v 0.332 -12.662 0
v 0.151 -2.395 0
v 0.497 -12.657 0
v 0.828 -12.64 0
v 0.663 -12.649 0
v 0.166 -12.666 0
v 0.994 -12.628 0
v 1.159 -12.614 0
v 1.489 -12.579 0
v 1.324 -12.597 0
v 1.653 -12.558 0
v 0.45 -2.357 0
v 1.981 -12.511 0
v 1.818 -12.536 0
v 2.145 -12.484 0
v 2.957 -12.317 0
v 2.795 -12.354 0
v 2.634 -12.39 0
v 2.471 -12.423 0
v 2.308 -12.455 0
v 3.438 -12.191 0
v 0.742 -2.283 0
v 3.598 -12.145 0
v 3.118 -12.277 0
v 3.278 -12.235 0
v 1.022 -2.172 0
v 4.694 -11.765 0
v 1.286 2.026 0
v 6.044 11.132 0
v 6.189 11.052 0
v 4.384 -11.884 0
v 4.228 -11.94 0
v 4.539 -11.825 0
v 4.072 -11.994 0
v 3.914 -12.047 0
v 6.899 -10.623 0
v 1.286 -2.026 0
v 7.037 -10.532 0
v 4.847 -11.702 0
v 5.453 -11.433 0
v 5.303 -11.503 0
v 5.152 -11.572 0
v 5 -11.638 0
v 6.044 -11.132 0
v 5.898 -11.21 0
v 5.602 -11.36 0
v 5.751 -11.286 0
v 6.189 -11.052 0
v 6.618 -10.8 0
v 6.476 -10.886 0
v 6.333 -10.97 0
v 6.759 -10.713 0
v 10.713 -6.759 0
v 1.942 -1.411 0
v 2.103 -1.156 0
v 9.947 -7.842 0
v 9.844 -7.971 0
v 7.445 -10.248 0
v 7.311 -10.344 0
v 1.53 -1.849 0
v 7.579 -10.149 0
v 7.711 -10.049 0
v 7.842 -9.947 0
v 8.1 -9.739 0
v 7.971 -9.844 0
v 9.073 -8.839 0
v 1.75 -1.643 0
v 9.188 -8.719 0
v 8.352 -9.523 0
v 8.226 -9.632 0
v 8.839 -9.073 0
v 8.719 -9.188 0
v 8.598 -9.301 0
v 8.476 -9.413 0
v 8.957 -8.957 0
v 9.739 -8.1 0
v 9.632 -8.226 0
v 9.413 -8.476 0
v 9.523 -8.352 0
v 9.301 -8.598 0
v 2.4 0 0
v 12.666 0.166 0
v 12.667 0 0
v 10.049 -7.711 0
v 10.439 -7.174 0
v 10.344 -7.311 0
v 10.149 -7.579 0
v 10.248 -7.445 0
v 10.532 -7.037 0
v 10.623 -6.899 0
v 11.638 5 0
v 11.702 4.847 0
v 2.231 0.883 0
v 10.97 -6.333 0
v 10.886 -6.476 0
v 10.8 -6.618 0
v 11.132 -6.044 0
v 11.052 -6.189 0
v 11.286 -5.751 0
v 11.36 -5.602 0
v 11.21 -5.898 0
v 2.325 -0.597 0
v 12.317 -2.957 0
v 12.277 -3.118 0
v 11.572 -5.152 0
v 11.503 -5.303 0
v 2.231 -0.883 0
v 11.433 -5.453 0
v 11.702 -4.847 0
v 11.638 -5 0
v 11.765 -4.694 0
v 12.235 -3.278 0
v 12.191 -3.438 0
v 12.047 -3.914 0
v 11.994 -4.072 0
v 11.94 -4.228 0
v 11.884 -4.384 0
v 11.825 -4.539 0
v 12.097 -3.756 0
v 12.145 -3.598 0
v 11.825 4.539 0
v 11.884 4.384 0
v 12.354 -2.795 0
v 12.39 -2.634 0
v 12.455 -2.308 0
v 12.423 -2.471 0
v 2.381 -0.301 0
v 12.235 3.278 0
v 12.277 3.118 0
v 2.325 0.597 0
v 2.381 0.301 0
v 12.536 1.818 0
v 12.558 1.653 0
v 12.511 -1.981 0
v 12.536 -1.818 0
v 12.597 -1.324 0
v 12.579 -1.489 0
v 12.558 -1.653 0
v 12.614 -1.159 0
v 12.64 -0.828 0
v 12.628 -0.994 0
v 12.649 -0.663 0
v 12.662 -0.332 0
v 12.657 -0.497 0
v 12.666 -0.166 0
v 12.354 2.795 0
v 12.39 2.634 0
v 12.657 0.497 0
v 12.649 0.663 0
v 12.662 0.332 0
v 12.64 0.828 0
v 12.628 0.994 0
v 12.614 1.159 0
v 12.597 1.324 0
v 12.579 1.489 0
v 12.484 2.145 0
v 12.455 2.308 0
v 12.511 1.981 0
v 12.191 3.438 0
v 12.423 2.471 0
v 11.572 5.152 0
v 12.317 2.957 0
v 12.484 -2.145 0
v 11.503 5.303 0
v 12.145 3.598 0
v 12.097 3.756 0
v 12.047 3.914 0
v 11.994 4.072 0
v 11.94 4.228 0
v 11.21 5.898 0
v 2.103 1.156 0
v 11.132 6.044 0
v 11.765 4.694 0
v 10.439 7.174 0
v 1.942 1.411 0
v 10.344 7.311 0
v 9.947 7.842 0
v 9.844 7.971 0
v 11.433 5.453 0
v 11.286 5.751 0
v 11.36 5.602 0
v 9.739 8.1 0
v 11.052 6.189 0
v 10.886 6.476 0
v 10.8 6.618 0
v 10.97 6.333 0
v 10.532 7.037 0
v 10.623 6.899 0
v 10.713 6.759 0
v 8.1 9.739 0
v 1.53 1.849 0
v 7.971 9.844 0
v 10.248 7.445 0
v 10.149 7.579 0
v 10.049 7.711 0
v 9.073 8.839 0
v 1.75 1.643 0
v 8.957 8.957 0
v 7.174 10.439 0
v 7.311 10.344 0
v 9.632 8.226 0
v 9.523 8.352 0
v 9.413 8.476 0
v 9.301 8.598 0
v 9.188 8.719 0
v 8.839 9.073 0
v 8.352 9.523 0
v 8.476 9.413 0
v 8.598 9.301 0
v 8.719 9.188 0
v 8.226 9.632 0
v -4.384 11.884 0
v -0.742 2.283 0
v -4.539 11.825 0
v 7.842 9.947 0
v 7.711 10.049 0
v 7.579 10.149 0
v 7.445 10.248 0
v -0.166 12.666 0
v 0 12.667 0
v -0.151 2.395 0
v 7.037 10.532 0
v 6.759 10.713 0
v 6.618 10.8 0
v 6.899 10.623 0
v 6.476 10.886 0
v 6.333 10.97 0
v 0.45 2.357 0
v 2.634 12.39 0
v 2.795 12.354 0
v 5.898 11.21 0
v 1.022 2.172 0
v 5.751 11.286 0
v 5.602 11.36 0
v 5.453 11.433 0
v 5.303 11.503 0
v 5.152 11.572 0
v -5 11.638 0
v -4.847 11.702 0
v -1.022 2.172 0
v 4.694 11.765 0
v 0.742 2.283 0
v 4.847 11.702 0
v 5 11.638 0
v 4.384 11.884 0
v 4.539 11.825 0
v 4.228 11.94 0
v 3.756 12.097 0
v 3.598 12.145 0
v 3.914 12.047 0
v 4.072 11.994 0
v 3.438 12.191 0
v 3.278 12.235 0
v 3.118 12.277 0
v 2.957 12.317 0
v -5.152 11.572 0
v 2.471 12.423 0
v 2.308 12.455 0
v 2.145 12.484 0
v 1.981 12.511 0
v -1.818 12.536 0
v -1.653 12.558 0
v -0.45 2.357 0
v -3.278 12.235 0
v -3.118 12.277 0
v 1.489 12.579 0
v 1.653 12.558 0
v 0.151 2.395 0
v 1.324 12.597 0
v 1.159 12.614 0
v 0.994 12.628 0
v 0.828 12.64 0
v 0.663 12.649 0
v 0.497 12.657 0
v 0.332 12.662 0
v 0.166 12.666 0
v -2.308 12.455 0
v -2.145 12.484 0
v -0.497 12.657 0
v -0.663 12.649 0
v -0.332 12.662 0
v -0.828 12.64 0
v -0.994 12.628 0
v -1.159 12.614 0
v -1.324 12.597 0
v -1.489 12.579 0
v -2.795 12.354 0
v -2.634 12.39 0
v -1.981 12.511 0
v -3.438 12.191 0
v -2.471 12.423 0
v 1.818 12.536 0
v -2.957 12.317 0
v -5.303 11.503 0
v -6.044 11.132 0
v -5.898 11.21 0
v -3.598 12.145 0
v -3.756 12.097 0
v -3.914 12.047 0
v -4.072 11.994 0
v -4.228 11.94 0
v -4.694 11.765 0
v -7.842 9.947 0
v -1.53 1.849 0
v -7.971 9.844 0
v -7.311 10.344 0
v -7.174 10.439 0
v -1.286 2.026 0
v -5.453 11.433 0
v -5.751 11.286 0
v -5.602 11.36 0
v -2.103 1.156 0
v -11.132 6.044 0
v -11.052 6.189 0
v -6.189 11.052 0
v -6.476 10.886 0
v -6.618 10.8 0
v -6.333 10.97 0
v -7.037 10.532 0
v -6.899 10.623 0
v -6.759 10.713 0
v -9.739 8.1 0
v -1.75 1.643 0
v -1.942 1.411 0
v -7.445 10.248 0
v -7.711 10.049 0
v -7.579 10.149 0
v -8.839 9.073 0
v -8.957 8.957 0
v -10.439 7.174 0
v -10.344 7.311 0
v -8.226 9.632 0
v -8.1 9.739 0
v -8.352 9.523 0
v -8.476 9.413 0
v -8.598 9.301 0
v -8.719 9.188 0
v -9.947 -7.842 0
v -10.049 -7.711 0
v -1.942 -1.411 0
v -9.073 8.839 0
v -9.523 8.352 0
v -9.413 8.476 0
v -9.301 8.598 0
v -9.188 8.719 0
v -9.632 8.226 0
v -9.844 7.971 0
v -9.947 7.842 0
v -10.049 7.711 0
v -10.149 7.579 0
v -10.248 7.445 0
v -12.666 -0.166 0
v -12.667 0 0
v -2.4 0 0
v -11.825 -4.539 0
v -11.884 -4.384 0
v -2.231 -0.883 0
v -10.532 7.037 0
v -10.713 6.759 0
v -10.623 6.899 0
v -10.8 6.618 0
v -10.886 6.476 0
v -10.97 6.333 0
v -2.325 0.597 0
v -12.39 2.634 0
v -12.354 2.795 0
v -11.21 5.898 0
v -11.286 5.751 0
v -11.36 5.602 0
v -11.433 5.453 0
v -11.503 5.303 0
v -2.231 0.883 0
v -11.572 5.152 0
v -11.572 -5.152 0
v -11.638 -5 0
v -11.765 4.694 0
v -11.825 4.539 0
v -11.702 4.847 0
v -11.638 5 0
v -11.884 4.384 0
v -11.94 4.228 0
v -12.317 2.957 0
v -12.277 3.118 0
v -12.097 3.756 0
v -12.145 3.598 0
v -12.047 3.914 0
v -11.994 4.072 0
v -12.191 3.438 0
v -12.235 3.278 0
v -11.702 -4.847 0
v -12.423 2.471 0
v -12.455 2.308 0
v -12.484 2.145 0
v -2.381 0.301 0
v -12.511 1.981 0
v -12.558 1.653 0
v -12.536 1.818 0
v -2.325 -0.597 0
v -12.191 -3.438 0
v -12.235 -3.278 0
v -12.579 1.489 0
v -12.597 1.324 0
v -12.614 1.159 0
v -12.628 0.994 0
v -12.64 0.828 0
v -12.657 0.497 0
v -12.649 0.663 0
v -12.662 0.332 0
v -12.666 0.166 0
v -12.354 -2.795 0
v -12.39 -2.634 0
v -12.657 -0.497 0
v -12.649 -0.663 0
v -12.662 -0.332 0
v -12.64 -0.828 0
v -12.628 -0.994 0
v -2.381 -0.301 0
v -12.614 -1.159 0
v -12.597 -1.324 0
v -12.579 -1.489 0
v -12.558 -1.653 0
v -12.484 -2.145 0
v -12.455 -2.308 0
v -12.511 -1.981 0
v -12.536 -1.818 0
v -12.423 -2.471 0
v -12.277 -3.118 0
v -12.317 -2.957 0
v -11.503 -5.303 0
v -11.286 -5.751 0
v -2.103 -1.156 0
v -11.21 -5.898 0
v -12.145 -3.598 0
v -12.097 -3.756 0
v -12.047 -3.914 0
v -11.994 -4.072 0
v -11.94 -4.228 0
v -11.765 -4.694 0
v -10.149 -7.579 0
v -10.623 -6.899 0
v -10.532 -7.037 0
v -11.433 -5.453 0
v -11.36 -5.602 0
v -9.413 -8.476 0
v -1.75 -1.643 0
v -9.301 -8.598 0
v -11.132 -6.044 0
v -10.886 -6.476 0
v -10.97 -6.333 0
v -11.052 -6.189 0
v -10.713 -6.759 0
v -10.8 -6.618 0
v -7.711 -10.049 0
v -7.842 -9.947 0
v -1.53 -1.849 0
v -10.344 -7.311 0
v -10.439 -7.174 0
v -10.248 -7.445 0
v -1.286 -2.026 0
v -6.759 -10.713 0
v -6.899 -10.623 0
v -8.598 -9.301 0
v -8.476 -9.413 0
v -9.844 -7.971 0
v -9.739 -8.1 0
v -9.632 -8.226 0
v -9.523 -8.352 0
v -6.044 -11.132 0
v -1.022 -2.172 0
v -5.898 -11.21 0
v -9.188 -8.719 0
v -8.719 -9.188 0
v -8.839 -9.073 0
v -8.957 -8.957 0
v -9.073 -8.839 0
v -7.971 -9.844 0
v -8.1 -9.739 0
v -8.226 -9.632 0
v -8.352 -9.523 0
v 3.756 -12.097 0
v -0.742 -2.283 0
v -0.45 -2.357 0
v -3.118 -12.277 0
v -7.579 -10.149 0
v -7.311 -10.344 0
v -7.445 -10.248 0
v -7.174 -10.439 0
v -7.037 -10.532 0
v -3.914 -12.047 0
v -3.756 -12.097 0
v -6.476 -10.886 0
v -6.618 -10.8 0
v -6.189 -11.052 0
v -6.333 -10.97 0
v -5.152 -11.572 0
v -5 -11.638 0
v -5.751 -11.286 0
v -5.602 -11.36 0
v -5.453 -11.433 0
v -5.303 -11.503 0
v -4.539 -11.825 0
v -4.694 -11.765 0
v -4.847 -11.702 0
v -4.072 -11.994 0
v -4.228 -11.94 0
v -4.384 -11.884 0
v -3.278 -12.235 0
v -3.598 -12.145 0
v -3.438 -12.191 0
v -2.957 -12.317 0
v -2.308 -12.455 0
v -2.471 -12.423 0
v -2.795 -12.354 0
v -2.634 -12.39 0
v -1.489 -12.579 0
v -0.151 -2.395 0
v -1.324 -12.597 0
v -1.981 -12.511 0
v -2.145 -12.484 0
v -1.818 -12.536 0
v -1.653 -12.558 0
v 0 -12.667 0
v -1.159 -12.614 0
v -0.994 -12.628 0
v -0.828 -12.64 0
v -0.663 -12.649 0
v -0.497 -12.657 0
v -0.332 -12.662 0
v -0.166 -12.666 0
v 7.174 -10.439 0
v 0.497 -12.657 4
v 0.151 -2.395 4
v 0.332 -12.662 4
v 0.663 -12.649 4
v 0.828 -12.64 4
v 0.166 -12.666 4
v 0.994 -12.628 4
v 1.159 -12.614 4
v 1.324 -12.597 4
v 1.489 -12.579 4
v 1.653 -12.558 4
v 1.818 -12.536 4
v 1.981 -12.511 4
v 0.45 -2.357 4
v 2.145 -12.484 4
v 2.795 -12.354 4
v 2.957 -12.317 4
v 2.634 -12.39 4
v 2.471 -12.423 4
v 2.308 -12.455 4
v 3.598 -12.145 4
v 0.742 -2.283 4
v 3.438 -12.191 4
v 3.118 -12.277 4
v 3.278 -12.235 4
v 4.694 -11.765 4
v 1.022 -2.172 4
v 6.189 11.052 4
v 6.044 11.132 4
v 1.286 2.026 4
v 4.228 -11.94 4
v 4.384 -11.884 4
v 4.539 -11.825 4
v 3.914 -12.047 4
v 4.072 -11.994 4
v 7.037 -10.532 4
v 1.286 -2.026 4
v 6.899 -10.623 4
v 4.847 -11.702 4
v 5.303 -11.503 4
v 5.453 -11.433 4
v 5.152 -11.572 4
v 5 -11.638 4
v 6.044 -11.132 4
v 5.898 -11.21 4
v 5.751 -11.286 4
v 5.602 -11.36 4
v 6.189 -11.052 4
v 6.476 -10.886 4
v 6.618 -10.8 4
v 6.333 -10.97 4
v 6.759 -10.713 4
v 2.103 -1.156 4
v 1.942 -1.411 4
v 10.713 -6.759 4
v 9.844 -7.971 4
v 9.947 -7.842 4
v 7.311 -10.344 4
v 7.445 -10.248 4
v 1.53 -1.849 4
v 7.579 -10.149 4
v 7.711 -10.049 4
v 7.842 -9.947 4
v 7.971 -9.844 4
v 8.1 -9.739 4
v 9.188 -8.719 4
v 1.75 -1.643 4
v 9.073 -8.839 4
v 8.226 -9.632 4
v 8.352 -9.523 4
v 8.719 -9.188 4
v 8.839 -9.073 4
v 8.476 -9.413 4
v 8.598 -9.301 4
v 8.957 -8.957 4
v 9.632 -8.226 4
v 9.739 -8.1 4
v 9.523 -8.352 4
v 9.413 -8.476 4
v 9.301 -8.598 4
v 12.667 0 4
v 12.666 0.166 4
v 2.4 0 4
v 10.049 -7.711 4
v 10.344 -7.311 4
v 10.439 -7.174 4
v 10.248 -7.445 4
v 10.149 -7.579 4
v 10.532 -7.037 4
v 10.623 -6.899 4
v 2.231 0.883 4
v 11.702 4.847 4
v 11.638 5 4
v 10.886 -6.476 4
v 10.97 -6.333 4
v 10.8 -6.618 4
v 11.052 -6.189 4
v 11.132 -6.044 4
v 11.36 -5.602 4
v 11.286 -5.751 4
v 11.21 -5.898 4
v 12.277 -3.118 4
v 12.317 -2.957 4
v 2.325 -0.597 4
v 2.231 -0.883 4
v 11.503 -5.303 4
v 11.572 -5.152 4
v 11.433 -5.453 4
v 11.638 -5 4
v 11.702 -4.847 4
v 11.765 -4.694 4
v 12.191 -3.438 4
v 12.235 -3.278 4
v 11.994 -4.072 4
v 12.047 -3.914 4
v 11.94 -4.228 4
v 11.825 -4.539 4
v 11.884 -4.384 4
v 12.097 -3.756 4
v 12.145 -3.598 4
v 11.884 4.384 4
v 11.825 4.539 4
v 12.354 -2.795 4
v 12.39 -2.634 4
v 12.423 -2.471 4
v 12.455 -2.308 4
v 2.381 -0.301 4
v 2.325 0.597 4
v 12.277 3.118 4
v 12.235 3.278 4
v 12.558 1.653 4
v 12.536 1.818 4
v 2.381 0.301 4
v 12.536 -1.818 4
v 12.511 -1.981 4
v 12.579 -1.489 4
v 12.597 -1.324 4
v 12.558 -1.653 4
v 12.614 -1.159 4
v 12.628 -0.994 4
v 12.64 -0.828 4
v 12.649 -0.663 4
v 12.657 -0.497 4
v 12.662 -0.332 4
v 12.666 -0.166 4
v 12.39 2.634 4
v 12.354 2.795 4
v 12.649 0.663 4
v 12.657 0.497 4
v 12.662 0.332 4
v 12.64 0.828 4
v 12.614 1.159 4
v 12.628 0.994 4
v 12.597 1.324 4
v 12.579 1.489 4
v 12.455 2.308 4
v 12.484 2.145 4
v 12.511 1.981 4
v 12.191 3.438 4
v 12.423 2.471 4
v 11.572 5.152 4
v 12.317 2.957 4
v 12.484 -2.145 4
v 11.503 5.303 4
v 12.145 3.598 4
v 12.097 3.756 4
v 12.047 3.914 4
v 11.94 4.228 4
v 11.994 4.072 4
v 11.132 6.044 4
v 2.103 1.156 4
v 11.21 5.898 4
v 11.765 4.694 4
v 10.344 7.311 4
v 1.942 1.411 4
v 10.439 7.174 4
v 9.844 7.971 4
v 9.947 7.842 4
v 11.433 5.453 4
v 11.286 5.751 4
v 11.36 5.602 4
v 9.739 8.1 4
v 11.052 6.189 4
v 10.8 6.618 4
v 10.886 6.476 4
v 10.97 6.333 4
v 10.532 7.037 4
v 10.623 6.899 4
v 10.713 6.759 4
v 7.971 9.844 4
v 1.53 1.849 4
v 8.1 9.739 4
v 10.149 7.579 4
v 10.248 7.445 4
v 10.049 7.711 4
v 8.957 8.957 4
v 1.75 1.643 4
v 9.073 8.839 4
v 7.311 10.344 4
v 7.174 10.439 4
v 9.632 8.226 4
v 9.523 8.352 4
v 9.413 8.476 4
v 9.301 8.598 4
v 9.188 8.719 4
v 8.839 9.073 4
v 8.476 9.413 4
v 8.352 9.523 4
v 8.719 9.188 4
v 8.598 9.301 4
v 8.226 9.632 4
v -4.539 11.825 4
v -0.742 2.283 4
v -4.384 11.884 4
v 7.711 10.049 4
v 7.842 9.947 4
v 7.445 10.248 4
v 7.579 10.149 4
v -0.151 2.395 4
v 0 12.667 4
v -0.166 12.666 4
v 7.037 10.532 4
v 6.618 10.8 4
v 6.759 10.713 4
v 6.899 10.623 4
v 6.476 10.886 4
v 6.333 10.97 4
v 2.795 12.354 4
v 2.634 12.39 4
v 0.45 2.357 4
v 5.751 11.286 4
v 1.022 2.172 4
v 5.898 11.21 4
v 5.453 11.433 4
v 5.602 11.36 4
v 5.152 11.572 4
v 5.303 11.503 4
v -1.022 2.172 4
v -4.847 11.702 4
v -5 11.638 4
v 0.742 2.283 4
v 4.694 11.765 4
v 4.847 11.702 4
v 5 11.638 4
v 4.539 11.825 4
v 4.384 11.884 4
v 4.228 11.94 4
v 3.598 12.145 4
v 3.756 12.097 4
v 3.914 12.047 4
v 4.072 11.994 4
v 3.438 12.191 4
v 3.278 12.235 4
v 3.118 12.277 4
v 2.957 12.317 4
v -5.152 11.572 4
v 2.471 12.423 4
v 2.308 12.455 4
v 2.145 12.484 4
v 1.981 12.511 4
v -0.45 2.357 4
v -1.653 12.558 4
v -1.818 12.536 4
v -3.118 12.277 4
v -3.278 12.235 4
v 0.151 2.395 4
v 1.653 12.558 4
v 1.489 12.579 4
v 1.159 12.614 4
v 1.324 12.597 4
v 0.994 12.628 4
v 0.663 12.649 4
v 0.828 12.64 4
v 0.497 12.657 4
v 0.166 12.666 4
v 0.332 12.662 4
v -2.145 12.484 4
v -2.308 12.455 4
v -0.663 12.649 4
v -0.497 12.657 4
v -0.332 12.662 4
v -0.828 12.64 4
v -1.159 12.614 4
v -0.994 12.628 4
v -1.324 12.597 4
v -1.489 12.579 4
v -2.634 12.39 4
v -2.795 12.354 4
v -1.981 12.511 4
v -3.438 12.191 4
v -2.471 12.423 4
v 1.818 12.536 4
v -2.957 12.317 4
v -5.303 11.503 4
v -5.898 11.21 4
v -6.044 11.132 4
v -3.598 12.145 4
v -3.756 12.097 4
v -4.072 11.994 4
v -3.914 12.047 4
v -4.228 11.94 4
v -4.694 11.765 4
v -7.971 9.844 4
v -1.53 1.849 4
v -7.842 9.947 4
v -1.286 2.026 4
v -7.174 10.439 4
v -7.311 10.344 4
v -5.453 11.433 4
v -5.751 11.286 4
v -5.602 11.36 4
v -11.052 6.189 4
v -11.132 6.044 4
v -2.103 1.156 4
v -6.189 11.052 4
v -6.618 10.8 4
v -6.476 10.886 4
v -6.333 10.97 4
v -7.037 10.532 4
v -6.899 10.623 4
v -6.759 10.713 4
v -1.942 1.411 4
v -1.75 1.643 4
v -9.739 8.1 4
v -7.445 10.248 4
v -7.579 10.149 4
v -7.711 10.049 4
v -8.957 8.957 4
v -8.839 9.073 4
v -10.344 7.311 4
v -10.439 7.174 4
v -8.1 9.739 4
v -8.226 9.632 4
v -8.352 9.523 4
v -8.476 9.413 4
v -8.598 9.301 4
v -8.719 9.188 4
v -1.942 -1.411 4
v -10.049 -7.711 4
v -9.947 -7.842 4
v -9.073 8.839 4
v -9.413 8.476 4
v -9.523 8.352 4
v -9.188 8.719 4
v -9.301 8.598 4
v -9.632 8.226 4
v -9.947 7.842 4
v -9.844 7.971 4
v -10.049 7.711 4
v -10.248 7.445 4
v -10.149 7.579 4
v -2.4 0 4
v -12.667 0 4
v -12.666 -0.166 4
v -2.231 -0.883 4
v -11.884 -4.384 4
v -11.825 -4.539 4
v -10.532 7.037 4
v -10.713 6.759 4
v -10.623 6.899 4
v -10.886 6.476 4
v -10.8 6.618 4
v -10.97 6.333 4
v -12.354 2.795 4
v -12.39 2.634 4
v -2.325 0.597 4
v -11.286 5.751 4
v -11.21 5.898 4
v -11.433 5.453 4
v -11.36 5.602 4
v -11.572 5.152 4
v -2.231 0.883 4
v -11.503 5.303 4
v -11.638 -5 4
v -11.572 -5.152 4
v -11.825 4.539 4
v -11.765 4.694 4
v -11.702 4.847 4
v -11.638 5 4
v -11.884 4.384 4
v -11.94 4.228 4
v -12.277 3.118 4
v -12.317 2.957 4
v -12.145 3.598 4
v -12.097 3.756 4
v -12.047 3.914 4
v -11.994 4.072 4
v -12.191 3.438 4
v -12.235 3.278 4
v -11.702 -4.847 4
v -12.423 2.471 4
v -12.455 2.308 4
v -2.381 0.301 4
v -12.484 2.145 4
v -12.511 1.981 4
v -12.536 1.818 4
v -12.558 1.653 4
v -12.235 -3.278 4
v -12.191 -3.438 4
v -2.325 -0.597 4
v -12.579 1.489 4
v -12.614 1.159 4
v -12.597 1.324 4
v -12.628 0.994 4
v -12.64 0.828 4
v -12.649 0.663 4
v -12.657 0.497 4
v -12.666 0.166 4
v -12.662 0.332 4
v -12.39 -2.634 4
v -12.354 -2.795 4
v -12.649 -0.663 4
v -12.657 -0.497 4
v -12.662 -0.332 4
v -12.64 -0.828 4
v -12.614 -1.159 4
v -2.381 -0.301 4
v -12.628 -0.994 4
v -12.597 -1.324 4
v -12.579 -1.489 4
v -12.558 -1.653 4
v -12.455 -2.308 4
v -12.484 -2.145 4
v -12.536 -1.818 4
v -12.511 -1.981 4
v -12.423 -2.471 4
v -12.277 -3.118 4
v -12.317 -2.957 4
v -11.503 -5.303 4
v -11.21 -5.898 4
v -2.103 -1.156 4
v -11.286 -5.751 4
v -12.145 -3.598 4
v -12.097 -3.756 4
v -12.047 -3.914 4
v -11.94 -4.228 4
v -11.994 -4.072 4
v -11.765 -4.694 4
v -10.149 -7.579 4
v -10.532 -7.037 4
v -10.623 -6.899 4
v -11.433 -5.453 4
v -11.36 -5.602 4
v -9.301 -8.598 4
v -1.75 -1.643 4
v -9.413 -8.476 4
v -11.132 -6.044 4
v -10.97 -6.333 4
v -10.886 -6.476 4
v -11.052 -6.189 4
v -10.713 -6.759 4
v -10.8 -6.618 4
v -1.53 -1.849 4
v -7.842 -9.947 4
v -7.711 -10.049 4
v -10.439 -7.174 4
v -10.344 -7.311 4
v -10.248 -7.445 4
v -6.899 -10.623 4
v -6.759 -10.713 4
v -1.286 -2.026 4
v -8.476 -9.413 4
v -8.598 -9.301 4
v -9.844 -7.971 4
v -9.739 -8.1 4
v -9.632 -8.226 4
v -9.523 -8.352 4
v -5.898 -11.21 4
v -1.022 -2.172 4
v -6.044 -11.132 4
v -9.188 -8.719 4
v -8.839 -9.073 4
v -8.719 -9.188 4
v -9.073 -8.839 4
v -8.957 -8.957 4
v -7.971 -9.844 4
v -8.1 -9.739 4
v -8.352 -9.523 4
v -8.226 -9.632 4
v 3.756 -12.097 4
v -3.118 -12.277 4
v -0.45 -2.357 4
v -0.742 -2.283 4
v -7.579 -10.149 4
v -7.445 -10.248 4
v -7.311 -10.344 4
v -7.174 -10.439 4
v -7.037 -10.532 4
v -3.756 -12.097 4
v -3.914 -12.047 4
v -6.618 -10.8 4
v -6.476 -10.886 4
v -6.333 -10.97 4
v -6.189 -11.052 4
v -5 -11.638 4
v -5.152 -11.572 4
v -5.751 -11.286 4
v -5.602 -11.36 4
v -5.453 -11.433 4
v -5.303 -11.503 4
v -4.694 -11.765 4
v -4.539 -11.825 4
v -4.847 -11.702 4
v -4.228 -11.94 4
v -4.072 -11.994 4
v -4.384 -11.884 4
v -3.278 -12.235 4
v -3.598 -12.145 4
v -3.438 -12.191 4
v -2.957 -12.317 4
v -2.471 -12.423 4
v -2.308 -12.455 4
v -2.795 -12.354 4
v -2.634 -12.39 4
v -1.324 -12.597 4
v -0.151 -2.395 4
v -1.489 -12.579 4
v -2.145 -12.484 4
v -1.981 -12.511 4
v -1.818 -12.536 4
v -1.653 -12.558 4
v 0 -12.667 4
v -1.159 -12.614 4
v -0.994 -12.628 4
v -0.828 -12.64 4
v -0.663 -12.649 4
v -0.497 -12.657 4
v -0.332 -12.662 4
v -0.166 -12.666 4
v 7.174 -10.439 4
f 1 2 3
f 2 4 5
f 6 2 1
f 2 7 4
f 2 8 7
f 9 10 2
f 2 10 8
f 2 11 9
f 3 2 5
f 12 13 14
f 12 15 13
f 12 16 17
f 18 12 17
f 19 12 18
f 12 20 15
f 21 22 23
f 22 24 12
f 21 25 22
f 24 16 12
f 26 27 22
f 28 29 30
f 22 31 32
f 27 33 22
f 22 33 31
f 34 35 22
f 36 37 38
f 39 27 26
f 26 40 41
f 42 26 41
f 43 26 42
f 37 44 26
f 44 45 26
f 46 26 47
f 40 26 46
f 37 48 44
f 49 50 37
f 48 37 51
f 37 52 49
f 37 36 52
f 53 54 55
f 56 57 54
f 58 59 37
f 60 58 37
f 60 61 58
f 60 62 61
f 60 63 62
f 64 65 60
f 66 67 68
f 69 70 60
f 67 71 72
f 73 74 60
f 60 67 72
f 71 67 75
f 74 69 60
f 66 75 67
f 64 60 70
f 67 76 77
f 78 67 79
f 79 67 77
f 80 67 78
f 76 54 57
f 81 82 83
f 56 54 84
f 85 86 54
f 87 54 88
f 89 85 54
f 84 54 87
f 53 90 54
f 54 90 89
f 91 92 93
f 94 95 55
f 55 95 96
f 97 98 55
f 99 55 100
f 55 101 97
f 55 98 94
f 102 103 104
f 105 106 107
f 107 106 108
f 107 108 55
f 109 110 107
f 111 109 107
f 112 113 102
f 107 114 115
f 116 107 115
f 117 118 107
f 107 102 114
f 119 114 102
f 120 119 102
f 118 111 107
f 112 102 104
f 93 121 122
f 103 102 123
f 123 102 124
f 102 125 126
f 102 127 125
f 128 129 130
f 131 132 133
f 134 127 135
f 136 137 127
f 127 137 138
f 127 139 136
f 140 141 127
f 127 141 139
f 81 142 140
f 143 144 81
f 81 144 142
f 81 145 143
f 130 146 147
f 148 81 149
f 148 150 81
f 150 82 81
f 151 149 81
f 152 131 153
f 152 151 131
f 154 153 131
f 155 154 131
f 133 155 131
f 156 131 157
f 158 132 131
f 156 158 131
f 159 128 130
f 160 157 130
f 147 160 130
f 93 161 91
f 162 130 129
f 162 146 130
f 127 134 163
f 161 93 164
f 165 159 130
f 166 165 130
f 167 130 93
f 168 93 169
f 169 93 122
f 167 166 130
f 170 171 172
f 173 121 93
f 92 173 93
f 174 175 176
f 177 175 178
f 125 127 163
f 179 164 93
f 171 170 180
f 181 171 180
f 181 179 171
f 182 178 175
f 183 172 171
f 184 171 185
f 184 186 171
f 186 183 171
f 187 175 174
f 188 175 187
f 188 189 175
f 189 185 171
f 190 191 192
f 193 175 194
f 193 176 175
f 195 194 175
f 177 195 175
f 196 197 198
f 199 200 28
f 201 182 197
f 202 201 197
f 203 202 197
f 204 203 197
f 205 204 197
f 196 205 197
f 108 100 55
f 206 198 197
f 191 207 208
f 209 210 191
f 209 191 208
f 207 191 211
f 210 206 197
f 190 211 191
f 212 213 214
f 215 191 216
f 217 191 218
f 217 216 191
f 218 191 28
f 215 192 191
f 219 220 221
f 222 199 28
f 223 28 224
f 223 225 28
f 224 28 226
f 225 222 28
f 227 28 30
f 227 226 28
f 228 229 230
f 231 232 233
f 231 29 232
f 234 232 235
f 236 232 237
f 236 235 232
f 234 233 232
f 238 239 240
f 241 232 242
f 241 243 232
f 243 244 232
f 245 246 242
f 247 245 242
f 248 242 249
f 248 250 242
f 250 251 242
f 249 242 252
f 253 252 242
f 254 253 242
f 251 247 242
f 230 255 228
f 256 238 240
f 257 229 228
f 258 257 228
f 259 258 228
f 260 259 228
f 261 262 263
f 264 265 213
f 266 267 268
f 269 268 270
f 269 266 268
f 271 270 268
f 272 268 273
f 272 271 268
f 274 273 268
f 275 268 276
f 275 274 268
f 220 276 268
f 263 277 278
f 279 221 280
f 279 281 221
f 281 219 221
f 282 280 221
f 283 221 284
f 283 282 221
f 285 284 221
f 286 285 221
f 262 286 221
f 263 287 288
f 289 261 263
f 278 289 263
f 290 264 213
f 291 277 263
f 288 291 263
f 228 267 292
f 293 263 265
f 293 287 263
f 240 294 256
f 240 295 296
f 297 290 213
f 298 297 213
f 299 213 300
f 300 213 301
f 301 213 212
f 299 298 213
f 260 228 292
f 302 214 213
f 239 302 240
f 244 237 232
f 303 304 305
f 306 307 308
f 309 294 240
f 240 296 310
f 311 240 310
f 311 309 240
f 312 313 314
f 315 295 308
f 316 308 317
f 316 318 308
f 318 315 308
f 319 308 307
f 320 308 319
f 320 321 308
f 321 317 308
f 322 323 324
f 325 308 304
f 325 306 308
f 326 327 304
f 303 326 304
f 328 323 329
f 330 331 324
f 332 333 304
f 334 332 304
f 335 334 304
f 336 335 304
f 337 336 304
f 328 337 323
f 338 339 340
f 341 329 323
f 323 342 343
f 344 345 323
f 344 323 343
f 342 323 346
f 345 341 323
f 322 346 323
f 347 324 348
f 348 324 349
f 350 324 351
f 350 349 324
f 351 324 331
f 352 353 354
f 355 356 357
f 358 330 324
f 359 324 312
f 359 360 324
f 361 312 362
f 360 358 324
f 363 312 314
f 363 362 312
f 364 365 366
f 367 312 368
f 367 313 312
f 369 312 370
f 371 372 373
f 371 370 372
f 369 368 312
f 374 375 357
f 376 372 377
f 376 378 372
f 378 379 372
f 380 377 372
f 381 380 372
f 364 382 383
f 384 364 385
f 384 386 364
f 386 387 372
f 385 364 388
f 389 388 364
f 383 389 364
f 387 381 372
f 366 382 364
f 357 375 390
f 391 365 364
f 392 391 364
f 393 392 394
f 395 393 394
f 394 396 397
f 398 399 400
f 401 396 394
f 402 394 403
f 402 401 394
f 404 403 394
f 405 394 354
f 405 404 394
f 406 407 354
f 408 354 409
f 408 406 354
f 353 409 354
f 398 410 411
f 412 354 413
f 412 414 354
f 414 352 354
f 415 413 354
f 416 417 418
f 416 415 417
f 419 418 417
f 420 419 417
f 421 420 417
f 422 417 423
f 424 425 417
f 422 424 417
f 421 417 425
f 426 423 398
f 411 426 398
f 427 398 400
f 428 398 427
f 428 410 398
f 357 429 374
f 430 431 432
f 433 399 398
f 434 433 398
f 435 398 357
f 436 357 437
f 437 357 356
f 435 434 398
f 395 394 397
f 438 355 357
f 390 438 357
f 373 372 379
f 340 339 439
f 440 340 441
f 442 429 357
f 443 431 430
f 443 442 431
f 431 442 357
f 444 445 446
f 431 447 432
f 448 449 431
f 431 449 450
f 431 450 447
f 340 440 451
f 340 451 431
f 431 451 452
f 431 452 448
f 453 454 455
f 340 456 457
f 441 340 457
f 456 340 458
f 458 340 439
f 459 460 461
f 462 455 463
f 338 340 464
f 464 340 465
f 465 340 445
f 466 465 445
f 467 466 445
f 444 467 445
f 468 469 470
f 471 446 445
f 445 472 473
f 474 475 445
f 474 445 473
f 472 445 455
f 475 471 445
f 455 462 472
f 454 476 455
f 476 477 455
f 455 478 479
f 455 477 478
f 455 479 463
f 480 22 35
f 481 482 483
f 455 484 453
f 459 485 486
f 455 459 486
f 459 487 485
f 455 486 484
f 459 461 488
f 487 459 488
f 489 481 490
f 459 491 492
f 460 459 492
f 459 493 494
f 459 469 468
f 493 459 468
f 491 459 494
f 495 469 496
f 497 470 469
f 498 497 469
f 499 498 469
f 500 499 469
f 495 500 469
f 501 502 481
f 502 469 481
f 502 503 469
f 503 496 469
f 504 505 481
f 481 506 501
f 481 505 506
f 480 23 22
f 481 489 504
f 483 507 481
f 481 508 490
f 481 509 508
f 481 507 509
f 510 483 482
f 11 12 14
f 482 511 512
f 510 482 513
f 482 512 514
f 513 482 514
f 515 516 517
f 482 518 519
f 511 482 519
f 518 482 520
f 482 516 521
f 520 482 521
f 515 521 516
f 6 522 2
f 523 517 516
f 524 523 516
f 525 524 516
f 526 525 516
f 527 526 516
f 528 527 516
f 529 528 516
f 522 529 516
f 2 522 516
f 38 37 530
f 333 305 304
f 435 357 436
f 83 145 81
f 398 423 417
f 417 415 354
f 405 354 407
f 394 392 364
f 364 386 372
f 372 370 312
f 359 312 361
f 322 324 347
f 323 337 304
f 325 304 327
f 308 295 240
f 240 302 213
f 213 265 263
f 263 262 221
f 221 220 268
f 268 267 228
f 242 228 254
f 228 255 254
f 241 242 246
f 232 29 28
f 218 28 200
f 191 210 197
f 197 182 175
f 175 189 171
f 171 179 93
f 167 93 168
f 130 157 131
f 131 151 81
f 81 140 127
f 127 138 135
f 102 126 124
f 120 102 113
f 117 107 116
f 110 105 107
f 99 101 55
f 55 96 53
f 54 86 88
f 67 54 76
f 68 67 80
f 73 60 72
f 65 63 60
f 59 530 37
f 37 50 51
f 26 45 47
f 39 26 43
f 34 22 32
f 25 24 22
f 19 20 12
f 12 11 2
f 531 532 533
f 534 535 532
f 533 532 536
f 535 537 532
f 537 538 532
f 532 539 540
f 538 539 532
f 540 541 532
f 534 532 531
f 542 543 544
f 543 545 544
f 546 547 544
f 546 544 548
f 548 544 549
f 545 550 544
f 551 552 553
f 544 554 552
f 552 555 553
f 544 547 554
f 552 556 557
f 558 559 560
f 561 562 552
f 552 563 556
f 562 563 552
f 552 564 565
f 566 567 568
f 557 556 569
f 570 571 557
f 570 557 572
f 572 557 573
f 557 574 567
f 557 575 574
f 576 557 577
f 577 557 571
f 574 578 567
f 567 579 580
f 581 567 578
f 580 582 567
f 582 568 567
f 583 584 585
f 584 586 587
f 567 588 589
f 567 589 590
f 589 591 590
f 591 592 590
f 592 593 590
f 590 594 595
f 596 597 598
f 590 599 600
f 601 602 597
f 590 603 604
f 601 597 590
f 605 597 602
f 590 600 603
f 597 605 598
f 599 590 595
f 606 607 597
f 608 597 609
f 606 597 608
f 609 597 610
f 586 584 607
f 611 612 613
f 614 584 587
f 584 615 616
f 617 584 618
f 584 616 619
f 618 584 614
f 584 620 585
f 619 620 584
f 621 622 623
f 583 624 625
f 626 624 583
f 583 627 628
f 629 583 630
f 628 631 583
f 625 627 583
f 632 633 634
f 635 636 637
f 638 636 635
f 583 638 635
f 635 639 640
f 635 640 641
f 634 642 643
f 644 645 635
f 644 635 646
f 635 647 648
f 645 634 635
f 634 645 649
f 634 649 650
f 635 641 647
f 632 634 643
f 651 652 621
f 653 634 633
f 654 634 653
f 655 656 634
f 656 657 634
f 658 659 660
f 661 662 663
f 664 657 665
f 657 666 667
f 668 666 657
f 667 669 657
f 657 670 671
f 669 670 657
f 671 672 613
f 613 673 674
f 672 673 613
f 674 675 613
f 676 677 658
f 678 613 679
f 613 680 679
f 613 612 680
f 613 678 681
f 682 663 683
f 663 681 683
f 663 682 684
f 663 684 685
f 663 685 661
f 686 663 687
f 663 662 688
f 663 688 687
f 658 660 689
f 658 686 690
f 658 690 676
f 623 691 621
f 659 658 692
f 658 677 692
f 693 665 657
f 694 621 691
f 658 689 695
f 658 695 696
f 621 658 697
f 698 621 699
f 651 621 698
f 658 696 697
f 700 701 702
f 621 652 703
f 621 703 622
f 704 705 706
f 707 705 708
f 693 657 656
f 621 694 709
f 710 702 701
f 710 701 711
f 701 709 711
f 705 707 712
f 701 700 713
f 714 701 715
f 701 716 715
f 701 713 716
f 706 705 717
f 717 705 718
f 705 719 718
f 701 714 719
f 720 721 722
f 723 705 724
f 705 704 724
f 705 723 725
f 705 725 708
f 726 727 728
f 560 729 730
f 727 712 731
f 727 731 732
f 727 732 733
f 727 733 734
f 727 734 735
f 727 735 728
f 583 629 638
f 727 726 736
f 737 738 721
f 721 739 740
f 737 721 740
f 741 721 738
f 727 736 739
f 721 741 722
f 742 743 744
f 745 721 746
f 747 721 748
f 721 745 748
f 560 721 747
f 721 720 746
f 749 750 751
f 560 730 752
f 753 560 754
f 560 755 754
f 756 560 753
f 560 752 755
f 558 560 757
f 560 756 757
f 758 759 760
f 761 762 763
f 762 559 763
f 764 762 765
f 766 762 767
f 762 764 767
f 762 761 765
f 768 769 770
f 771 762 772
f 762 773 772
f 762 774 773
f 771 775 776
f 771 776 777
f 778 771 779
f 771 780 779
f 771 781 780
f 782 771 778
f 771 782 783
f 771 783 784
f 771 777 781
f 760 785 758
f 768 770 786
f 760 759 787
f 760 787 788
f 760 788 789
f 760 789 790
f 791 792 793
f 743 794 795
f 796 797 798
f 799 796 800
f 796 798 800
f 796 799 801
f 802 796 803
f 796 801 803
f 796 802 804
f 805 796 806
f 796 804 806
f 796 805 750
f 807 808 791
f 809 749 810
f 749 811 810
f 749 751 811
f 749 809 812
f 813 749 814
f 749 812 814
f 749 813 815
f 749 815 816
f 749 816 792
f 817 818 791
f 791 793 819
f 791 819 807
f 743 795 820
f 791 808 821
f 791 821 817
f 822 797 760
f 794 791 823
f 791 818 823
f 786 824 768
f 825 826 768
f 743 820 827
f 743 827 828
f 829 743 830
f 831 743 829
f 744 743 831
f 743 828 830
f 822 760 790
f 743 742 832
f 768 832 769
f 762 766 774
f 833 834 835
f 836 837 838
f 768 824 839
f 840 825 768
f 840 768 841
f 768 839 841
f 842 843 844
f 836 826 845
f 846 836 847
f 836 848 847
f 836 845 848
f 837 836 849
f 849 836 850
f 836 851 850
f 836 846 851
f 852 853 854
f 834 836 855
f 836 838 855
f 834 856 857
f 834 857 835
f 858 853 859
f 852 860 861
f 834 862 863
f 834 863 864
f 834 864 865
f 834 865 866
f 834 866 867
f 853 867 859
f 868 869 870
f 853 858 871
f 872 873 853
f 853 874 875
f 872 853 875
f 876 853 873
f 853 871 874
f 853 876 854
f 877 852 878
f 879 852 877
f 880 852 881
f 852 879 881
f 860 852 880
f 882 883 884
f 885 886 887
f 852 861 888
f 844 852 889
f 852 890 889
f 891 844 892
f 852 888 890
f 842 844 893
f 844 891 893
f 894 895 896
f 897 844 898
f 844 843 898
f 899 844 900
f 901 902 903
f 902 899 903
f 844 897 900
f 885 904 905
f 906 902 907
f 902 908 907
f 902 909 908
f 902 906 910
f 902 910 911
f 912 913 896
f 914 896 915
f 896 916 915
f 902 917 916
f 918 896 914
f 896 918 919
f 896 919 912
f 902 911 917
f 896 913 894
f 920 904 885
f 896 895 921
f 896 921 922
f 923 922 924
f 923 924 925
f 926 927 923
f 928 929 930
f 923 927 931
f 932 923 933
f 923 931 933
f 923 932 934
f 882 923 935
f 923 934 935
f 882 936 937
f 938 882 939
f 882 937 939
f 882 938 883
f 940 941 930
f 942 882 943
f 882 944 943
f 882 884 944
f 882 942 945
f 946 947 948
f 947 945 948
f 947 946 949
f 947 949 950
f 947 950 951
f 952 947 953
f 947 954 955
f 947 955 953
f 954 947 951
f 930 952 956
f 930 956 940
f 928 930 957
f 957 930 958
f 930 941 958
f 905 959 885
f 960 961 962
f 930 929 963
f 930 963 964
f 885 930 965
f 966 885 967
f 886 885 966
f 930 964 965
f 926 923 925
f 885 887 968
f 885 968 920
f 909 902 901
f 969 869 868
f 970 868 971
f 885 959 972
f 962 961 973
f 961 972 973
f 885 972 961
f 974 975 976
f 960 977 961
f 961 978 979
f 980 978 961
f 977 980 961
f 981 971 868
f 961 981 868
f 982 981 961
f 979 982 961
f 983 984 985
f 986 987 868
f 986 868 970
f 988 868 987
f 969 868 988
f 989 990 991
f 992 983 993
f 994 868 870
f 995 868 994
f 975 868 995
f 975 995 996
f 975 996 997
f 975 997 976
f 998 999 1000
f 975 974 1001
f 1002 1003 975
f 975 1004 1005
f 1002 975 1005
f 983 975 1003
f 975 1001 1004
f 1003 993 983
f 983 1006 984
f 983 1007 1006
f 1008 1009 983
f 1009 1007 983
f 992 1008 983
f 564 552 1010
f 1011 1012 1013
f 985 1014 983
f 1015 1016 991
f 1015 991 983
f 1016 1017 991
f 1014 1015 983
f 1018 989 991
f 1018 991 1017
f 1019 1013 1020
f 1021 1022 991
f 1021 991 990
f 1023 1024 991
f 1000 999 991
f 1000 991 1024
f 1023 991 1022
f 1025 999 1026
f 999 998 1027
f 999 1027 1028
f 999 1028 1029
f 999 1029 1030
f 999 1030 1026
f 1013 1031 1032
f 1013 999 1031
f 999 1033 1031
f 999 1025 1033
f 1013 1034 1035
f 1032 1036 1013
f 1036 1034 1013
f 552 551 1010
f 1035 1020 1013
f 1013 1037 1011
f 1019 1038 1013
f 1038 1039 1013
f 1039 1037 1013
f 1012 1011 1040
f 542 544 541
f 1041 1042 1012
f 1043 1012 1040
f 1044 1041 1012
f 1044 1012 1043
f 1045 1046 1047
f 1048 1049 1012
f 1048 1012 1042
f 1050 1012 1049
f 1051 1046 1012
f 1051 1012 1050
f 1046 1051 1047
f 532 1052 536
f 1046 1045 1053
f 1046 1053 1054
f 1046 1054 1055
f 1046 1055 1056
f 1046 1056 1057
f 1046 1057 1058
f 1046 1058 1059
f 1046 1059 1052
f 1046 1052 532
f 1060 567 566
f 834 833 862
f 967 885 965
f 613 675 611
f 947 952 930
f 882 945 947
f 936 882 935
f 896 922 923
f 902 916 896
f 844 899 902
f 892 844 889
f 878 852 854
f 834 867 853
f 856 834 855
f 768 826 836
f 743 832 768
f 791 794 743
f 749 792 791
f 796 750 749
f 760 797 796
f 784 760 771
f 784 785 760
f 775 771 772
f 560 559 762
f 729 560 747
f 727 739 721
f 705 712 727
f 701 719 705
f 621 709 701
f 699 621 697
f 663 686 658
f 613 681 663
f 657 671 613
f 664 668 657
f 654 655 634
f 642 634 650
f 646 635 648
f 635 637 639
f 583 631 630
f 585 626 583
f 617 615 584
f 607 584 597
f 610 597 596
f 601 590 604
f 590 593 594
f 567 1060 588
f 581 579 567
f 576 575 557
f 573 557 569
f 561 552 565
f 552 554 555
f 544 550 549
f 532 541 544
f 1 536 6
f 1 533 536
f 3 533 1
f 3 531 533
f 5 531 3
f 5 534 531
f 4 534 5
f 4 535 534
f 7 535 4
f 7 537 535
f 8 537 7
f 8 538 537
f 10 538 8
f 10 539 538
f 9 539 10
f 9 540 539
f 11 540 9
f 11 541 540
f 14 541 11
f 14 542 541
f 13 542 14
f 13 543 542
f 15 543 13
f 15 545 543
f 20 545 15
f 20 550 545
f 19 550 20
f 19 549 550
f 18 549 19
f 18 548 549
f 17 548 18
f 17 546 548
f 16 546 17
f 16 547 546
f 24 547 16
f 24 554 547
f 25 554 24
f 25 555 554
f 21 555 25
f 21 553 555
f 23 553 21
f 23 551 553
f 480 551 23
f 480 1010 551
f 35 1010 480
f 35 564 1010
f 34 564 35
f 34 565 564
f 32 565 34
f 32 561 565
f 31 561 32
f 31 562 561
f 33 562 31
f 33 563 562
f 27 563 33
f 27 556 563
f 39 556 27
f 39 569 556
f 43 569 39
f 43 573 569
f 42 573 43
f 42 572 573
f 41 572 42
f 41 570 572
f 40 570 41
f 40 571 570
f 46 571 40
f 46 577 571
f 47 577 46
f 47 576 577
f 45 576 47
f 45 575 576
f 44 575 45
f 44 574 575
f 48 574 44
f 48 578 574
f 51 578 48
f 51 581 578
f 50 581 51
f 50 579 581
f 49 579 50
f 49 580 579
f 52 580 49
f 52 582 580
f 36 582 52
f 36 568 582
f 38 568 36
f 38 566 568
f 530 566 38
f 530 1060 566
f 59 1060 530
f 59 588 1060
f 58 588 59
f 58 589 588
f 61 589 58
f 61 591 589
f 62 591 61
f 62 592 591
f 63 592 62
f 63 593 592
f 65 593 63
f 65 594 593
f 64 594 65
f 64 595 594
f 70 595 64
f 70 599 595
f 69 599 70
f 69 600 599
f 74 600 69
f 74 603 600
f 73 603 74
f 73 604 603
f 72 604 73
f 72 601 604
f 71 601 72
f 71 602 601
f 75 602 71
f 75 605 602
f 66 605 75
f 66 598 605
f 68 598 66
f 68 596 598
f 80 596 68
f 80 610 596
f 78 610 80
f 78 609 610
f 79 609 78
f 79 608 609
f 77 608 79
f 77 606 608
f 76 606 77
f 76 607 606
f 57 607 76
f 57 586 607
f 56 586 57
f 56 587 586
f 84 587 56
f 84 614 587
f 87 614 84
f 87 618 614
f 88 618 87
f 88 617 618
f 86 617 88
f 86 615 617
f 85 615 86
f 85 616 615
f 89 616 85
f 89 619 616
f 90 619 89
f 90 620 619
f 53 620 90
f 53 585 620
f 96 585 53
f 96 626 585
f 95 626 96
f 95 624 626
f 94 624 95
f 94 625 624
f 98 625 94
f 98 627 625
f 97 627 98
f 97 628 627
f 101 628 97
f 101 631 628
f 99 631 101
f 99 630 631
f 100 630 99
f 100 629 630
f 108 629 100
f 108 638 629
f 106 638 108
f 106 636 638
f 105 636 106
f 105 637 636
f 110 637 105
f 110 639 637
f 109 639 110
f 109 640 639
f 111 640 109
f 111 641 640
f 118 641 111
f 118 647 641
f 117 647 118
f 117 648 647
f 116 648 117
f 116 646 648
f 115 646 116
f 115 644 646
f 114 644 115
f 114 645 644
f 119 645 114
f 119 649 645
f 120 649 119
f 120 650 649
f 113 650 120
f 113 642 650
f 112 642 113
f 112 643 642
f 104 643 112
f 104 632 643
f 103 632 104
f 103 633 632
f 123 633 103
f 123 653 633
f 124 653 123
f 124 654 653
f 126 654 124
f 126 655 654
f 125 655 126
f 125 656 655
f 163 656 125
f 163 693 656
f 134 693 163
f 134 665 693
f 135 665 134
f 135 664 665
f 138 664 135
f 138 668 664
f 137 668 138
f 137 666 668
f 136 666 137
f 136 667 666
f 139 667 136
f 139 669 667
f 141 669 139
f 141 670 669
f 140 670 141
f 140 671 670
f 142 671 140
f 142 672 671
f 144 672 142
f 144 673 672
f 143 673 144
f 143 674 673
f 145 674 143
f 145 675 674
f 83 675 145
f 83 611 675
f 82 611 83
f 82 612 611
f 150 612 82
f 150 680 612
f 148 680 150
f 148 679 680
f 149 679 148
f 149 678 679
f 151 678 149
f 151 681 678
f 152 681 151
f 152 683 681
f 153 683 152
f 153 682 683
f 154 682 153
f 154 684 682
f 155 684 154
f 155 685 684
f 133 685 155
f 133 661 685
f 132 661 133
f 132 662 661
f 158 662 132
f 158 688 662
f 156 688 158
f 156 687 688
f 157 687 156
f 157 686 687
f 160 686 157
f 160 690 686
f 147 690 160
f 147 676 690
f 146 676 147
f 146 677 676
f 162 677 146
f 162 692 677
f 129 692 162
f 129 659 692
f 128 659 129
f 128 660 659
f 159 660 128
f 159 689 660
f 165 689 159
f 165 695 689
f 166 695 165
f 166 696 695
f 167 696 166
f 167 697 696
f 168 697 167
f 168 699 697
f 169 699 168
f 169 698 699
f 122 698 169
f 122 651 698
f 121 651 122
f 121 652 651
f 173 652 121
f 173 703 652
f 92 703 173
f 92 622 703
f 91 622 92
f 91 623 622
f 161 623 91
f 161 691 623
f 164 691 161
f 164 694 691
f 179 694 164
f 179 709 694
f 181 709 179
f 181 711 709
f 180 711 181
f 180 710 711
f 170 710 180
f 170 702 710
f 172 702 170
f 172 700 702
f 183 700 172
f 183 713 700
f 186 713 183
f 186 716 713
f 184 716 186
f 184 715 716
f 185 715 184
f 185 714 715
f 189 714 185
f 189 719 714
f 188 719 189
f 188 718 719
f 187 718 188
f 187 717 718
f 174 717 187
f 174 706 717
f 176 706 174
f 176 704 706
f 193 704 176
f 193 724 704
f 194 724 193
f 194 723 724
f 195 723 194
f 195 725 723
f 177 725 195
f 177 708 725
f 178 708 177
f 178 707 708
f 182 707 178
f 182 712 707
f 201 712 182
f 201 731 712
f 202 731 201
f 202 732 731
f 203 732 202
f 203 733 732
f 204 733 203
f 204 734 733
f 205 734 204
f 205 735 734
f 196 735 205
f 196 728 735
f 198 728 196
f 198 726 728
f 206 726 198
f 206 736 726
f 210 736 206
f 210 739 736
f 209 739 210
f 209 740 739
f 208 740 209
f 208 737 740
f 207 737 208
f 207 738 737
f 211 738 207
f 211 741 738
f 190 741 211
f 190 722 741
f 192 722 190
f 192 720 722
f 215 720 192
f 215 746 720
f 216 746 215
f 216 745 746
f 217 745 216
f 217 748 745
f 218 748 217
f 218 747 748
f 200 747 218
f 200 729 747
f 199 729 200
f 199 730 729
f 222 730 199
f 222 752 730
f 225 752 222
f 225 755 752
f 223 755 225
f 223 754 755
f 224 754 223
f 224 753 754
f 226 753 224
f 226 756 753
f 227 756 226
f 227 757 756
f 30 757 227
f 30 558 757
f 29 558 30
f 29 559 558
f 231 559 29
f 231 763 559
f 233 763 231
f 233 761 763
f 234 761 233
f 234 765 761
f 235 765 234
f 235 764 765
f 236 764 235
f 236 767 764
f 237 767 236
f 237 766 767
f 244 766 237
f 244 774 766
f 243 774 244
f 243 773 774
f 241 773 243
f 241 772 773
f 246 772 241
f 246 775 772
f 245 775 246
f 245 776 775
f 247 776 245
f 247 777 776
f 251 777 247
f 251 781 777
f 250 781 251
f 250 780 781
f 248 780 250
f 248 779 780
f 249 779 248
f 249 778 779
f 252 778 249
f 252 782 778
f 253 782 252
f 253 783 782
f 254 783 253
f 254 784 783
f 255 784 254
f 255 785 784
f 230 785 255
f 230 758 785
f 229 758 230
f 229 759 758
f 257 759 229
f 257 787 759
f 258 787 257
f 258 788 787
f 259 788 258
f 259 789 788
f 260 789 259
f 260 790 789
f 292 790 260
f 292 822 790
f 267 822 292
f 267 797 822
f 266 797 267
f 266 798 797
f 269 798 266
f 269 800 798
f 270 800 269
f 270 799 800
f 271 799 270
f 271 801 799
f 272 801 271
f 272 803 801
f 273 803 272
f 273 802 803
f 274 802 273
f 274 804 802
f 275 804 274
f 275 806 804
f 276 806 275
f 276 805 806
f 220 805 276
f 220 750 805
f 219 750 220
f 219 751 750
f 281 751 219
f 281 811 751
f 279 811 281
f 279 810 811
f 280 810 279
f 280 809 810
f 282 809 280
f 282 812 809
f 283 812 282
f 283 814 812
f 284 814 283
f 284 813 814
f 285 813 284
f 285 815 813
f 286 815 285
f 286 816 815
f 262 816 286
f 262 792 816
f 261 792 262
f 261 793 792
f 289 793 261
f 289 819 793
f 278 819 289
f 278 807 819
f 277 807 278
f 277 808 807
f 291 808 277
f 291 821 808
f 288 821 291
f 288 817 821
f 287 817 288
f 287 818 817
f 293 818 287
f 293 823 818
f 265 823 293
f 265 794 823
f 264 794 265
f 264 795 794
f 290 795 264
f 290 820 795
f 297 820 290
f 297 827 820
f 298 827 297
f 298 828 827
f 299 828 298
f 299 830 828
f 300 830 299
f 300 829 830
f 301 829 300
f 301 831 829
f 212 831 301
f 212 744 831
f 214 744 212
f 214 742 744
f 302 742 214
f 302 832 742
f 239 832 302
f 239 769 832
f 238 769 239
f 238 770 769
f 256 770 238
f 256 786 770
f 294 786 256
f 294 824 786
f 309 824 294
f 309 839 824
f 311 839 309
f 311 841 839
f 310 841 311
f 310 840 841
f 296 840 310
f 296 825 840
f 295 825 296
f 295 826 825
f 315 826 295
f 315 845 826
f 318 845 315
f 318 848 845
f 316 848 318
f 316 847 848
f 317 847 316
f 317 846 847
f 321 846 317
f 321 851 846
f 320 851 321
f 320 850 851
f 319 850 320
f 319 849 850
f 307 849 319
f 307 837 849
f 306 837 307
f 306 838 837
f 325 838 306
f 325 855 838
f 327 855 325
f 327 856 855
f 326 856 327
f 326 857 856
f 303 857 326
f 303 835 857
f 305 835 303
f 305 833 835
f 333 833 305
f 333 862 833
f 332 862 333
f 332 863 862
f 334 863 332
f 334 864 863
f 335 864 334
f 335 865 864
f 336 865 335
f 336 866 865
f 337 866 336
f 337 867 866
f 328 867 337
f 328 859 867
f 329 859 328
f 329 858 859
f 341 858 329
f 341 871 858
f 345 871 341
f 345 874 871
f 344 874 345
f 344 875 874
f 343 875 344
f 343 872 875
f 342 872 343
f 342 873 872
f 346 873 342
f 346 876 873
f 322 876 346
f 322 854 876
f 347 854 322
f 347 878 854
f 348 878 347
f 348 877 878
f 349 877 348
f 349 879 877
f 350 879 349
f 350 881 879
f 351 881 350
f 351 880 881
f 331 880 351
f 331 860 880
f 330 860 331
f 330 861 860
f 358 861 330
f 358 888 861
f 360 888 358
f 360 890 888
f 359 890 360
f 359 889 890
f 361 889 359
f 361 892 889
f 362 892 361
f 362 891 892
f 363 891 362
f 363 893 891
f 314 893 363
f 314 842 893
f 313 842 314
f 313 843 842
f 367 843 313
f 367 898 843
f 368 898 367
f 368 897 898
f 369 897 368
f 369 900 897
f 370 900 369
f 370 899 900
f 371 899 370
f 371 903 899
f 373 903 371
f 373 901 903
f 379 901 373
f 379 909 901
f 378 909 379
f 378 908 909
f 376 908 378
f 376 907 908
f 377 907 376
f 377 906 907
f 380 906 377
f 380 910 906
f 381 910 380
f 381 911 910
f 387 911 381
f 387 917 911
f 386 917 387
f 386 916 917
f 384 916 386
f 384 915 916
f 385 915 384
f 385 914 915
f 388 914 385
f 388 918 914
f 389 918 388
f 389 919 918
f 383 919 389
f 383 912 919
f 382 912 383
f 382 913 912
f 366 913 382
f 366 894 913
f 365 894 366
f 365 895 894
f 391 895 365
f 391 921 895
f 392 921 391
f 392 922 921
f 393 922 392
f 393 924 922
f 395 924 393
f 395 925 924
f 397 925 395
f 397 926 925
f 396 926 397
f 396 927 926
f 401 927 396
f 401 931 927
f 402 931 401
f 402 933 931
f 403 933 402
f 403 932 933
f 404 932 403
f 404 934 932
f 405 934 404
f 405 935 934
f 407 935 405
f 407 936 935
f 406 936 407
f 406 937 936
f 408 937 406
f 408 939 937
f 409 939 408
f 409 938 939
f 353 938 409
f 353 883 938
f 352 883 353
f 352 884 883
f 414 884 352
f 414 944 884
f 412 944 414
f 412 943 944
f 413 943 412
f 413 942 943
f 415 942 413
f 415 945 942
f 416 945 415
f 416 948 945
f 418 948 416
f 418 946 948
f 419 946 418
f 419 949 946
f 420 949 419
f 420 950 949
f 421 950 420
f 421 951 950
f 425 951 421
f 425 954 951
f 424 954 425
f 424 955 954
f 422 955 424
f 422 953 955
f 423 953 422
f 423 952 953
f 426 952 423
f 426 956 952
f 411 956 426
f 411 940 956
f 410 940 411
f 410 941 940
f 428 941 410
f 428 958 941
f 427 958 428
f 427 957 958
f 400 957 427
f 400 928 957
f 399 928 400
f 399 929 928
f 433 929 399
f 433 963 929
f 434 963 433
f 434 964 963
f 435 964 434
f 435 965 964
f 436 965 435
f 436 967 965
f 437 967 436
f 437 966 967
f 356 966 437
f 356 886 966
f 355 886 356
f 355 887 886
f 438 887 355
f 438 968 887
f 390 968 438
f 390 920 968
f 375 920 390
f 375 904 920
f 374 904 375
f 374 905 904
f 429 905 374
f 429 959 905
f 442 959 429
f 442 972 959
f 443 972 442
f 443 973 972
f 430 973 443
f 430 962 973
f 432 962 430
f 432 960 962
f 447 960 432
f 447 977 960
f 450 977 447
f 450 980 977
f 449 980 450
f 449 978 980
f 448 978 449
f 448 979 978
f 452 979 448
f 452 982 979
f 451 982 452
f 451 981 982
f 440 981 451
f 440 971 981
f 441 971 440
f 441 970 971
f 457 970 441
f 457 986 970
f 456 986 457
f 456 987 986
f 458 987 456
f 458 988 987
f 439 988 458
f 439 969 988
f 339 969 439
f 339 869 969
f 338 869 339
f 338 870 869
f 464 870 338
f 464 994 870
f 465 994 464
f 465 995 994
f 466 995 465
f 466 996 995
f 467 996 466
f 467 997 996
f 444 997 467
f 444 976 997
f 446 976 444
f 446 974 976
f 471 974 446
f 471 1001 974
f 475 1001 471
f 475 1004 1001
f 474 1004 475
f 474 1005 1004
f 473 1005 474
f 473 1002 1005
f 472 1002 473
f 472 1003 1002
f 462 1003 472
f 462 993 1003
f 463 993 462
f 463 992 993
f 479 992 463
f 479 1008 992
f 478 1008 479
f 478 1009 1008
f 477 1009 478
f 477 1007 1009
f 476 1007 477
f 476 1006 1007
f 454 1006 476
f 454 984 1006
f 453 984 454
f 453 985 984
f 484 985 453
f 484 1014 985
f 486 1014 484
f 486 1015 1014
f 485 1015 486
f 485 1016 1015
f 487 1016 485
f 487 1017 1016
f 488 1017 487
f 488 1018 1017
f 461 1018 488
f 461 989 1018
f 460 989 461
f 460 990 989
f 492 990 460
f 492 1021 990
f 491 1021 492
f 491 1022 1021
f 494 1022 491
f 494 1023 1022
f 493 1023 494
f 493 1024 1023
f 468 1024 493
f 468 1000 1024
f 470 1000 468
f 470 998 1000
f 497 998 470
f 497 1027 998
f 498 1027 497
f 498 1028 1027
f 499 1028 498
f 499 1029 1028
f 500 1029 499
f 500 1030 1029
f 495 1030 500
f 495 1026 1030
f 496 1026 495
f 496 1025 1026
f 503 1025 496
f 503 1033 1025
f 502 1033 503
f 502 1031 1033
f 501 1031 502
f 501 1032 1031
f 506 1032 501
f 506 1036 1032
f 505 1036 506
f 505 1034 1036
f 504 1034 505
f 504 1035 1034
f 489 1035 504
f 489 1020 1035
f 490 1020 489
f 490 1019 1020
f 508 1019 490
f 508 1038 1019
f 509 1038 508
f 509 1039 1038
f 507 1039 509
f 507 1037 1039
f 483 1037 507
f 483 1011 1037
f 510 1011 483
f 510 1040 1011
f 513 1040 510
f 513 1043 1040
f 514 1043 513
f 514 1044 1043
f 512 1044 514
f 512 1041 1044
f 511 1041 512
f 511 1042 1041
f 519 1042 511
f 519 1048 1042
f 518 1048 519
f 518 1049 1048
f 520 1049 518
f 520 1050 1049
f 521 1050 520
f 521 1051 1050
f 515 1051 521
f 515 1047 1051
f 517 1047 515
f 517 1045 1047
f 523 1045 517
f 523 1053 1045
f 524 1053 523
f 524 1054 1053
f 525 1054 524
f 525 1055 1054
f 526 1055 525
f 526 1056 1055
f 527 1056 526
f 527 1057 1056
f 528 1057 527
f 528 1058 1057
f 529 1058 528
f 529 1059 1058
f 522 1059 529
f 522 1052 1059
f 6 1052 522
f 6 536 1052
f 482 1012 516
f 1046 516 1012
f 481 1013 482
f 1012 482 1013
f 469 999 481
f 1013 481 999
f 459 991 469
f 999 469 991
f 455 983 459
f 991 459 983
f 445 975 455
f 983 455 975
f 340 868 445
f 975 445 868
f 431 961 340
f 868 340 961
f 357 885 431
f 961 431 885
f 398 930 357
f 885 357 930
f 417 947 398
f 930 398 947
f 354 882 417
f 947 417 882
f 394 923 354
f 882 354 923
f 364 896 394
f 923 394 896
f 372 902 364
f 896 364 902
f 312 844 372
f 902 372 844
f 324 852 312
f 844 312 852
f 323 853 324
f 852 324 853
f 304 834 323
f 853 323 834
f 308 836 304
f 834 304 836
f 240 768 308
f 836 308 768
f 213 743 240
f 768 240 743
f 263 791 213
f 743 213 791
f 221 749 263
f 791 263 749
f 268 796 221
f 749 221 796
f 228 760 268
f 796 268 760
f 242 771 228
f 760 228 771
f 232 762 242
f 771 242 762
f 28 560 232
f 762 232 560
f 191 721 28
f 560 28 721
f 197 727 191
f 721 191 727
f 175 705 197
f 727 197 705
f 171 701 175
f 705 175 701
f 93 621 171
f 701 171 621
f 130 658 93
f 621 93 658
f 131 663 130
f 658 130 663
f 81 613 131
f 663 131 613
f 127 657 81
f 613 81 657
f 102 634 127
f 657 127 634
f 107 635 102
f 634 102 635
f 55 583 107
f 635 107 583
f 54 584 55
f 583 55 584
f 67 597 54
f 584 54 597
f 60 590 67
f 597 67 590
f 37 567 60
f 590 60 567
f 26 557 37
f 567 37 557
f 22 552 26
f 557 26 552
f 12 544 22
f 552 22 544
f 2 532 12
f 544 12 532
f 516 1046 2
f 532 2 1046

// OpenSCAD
/***
 * @function circle_curve_gear_body
 * @brief Render the Circle body before tooth placement.
 * Source: [`functions/circle/curve_gear_circle_body.scad`](functions/circle/curve_gear_circle_body.scad)
 * @image ../images/functions/circle/curve_gear_circle_body.png curve gear circle body preview
 * @image ../utils/doxydown-support/table-spacer.png ⠀
 */
use <curve_gear_circle.scad>;
_main_example_circle_view("body");
